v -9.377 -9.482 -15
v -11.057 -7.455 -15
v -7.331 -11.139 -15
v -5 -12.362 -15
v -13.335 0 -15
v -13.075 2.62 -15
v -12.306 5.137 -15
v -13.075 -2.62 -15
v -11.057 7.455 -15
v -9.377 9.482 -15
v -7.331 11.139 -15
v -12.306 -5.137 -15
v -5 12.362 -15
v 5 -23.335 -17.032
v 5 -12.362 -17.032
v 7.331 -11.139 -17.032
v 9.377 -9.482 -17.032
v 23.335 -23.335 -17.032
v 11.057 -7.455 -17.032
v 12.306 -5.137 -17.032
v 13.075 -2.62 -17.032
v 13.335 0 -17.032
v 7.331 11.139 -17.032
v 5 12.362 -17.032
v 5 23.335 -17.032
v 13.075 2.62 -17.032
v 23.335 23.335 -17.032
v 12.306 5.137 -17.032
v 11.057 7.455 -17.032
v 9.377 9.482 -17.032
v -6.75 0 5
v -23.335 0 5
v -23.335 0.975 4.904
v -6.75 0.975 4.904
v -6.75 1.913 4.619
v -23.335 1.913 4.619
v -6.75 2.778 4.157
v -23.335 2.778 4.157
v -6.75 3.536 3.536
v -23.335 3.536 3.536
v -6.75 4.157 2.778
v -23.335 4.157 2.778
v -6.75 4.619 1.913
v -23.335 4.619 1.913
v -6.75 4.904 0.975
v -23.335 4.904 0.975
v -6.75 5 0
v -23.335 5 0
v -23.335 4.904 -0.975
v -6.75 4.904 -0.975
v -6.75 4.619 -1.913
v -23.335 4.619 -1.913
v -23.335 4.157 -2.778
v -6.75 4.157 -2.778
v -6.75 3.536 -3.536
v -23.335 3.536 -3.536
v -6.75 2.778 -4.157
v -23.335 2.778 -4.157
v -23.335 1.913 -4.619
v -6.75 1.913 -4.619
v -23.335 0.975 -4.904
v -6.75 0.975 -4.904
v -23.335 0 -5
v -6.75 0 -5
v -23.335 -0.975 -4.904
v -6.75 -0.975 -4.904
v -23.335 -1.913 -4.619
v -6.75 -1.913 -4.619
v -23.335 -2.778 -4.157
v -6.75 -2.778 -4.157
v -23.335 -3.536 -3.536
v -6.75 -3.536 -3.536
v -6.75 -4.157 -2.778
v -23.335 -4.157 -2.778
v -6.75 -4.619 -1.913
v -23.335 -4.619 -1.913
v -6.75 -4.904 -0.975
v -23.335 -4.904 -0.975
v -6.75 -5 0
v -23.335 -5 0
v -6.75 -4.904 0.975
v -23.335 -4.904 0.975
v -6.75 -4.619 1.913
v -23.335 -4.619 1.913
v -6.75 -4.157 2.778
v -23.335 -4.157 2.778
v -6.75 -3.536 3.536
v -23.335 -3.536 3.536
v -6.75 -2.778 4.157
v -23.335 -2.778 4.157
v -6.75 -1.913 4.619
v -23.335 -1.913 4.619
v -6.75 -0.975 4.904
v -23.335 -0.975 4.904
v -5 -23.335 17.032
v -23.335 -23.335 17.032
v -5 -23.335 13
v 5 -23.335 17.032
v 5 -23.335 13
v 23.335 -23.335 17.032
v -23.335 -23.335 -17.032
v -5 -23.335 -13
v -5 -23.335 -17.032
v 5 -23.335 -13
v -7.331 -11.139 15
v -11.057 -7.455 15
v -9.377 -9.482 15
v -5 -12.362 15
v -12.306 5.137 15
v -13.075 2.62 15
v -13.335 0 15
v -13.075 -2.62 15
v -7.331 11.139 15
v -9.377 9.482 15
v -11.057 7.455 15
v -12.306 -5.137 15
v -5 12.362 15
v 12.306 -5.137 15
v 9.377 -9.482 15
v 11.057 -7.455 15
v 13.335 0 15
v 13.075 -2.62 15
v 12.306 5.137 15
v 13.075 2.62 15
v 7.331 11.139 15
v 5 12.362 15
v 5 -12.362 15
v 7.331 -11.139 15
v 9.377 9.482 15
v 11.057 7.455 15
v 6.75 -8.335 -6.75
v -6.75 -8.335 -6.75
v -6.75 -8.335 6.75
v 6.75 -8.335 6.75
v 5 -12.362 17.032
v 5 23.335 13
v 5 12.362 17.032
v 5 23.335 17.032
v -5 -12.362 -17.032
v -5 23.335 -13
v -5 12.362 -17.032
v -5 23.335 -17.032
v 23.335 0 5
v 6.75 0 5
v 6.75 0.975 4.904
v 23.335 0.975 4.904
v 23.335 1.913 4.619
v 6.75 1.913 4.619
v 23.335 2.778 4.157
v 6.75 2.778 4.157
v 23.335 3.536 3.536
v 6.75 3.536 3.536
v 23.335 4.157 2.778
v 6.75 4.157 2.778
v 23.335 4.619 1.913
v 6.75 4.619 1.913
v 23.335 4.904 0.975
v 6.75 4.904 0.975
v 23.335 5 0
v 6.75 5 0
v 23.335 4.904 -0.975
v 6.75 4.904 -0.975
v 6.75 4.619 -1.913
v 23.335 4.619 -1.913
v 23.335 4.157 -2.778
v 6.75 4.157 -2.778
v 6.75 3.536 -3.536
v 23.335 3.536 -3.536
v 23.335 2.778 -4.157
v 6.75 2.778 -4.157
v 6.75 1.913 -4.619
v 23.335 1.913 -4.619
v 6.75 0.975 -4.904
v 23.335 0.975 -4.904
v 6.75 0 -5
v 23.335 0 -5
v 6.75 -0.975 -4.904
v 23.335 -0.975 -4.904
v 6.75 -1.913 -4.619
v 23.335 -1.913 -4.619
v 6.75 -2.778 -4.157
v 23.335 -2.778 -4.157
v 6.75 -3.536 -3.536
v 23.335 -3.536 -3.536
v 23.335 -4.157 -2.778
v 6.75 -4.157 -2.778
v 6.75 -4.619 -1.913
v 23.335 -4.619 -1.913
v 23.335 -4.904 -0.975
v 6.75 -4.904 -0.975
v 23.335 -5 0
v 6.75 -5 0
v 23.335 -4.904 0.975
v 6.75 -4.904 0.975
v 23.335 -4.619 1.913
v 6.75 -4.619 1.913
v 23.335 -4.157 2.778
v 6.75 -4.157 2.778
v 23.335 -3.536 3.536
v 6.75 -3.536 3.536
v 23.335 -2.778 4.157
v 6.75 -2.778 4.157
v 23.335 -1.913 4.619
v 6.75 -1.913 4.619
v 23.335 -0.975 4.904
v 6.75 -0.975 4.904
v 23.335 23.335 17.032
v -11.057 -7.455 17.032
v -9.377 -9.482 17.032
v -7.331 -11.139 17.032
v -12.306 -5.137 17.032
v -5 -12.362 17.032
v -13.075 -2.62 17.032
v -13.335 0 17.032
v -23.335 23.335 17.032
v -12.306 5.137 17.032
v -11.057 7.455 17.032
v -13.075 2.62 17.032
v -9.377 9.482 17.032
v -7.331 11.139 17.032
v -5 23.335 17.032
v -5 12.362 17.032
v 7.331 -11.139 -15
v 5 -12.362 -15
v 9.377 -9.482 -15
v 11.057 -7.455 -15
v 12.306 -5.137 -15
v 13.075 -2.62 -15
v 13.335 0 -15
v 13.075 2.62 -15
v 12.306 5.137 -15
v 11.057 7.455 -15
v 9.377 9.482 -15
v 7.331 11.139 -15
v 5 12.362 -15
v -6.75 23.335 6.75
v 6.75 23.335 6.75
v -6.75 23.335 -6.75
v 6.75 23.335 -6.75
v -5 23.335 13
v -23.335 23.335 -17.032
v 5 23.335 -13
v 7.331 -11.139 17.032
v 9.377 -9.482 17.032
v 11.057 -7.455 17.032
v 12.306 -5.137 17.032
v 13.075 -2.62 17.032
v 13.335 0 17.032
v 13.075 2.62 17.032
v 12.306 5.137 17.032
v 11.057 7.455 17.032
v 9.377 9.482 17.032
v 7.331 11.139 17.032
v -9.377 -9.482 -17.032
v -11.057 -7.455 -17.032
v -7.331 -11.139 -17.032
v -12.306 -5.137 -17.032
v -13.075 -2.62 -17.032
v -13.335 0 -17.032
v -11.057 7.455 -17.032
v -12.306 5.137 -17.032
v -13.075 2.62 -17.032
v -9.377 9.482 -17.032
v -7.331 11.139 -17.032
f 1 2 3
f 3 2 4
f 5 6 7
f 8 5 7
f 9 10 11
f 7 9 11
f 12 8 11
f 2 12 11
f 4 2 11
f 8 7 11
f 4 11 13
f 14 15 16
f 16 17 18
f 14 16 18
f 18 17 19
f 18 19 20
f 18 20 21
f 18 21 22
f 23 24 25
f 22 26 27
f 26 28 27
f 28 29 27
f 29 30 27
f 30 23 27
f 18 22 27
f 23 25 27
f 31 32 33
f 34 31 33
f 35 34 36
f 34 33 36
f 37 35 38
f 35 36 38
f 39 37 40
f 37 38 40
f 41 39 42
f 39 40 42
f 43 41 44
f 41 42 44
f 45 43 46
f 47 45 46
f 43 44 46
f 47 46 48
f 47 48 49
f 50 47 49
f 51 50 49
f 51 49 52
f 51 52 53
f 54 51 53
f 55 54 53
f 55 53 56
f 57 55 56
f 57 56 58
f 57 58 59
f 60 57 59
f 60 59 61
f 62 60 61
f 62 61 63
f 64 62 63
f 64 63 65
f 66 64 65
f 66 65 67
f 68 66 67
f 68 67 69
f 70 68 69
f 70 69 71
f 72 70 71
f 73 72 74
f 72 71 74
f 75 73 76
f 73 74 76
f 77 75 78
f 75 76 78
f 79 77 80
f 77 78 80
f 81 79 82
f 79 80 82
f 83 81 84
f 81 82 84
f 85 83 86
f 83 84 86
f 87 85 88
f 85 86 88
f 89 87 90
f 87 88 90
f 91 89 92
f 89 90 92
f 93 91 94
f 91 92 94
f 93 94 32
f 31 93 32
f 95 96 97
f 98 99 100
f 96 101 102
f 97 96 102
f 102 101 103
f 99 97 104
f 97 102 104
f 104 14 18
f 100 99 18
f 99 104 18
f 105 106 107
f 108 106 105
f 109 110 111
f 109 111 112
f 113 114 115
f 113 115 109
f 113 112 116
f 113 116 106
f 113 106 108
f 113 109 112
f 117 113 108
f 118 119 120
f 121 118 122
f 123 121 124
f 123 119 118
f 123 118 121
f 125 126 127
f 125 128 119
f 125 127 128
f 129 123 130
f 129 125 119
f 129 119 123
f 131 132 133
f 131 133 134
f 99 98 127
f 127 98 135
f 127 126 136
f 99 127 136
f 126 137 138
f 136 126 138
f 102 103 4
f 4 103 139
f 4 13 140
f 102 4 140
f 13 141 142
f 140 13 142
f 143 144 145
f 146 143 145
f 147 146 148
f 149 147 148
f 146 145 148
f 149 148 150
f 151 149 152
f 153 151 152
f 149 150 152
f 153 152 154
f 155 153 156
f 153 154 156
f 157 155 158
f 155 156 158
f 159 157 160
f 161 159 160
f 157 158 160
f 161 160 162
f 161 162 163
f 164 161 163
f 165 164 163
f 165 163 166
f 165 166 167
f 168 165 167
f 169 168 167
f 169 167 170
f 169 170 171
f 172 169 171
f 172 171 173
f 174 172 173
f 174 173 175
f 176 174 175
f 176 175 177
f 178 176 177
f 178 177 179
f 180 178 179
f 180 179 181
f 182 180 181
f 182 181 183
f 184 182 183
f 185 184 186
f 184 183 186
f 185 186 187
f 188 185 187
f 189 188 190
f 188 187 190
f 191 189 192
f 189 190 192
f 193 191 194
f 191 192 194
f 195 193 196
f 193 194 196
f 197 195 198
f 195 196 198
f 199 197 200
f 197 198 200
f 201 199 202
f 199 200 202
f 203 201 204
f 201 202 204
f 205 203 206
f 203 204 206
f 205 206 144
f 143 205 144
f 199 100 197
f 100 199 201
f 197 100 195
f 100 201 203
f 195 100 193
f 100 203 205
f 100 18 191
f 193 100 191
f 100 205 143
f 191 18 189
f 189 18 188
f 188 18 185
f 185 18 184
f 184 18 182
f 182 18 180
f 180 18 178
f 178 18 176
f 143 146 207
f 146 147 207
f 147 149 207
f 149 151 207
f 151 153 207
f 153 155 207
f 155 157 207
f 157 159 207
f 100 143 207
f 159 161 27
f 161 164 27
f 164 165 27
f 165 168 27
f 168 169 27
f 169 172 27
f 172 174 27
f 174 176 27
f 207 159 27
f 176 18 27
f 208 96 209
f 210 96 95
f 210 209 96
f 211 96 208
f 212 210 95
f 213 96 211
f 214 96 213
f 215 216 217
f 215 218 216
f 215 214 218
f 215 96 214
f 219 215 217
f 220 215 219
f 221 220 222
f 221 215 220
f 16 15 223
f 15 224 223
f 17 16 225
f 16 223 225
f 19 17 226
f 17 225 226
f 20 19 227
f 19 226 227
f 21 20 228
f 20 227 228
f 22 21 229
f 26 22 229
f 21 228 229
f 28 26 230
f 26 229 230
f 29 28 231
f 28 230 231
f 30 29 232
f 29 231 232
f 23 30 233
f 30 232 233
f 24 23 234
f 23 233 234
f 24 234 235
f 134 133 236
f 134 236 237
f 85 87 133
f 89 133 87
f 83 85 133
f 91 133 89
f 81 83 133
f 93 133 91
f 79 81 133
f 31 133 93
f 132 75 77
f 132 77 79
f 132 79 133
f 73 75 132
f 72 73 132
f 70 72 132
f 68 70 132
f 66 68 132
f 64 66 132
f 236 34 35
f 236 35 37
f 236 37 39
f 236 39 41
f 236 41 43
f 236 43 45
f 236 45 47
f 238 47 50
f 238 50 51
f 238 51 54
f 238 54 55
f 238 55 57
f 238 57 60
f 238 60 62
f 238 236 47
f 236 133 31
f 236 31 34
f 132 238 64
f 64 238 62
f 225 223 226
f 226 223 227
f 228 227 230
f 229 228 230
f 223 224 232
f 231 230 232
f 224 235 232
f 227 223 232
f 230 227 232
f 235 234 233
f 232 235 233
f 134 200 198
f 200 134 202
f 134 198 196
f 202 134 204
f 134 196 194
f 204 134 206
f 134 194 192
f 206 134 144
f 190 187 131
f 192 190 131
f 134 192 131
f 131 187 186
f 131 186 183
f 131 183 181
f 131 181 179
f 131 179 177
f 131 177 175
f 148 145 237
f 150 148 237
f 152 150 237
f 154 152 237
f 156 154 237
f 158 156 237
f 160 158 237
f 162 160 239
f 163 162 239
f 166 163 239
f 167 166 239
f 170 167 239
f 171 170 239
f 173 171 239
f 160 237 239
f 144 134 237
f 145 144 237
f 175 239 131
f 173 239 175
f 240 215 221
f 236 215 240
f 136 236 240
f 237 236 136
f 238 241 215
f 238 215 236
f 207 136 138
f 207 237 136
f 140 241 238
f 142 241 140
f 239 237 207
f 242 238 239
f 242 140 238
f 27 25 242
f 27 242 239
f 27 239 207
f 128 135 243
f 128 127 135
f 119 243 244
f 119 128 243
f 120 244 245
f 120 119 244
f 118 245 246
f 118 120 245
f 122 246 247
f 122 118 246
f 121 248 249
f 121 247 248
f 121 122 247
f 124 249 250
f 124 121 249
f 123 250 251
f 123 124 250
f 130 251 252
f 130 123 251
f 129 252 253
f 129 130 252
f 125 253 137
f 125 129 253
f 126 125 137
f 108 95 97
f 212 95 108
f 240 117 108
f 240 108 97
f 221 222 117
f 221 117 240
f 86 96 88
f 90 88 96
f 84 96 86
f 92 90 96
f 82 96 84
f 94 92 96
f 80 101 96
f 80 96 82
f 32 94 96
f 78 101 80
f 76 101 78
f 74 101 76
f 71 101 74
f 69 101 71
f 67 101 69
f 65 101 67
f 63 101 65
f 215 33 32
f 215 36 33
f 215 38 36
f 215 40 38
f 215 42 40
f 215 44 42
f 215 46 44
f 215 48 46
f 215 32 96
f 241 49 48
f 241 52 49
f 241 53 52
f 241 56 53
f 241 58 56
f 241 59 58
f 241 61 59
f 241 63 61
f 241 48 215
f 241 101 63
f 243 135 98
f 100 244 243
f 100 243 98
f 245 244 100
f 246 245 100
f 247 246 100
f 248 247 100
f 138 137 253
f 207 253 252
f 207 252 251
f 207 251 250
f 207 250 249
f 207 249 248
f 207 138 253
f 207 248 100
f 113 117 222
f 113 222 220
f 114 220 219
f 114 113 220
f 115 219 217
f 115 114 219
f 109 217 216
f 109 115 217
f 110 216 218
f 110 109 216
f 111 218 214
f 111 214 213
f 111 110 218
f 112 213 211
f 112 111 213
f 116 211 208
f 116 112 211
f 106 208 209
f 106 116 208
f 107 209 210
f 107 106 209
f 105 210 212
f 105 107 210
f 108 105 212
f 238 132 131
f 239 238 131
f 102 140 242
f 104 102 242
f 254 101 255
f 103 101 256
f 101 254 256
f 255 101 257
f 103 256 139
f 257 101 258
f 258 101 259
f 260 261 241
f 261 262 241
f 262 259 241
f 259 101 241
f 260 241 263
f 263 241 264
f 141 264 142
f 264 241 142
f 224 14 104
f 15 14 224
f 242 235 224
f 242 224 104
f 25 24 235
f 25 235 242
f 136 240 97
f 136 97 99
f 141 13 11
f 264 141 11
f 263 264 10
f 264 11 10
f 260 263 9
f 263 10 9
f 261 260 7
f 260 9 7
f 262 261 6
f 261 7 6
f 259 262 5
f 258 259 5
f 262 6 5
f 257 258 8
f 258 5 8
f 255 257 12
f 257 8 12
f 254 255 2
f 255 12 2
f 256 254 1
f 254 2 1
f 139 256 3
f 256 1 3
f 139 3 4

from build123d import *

# Parameters (mm, degrees)
SKETCH2_R           = 13.335
BOSS_EXTRUDE1_DEPTH = 2.032
SKETCH3_R           = 13.335
BOSS_EXTRUDE2_DEPTH = 2.032
BOSS_EXTRUDE3_START = -17.032
SKETCH5_W           = 46.67
SKETCH5_H           = 46.67
BOSS_EXTRUDE3_DEPTH = 34.064
SKETCH6_R           = 5
CUT_EXTRUDE1_DEPTH  = 55.888069277
SKETCH7_W           = 13.5
SKETCH7_H           = 13.5
CUT_EXTRUDE2_DEPTH  = 31.67
SKETCH9_W           = 10
SKETCH9_H           = 46.67
CUT_EXTRUDE3_DEPTH  = 4.032


with BuildPart() as part:
    # Sketch2 → Boss-Extrude1 (new body)
    with BuildSketch(Plane.XY.offset(15)):
        Circle(SKETCH2_R)
    extrude(amount=BOSS_EXTRUDE1_DEPTH)


with BuildPart() as body_2:
    # Sketch3 → Boss-Extrude2 (new body)
    with BuildSketch(Plane.XY.offset(-15)):
        Circle(SKETCH3_R)
    extrude(amount=-BOSS_EXTRUDE2_DEPTH)


with BuildPart() as body_3:
    # Sketch5 → Boss-Extrude3 (new body)
    with BuildSketch(Plane.XY.offset(BOSS_EXTRUDE3_START)):
        Rectangle(SKETCH5_W, SKETCH5_H)
    extrude(amount=BOSS_EXTRUDE3_DEPTH)

    # Sketch6 → Cut-Extrude1 (cut, through all)
    with BuildSketch(Plane.ZY.offset(23.335)):
        Circle(SKETCH6_R)
    extrude(amount=-CUT_EXTRUDE1_DEPTH, mode=Mode.SUBTRACT)

    # Sketch7 → Cut-Extrude2 (cut)
    with BuildSketch(Plane(origin=(0, 23.335, 0), x_dir=(1, 0, 0), z_dir=(0, 1, 0))):
        Rectangle(SKETCH7_W, SKETCH7_H)
    extrude(amount=-CUT_EXTRUDE2_DEPTH, mode=Mode.SUBTRACT)

    # Combine1: cut part, body 2
    add(part.part, mode=Mode.SUBTRACT)
    add(body_2.part, mode=Mode.SUBTRACT)

    # Sketch9 → Cut-Extrude3 (cut)
    with BuildSketch(Plane.XY.offset(17.032)):
        Rectangle(SKETCH9_W, SKETCH9_H)
    cut_extrude3 = extrude(amount=-CUT_EXTRUDE3_DEPTH, mode=Mode.SUBTRACT)

    # Mirror1: Cut-Extrude3 across plane
    add(cut_extrude3.mirror(Plane.XY), mode=Mode.SUBTRACT)


solid = body_3.part
